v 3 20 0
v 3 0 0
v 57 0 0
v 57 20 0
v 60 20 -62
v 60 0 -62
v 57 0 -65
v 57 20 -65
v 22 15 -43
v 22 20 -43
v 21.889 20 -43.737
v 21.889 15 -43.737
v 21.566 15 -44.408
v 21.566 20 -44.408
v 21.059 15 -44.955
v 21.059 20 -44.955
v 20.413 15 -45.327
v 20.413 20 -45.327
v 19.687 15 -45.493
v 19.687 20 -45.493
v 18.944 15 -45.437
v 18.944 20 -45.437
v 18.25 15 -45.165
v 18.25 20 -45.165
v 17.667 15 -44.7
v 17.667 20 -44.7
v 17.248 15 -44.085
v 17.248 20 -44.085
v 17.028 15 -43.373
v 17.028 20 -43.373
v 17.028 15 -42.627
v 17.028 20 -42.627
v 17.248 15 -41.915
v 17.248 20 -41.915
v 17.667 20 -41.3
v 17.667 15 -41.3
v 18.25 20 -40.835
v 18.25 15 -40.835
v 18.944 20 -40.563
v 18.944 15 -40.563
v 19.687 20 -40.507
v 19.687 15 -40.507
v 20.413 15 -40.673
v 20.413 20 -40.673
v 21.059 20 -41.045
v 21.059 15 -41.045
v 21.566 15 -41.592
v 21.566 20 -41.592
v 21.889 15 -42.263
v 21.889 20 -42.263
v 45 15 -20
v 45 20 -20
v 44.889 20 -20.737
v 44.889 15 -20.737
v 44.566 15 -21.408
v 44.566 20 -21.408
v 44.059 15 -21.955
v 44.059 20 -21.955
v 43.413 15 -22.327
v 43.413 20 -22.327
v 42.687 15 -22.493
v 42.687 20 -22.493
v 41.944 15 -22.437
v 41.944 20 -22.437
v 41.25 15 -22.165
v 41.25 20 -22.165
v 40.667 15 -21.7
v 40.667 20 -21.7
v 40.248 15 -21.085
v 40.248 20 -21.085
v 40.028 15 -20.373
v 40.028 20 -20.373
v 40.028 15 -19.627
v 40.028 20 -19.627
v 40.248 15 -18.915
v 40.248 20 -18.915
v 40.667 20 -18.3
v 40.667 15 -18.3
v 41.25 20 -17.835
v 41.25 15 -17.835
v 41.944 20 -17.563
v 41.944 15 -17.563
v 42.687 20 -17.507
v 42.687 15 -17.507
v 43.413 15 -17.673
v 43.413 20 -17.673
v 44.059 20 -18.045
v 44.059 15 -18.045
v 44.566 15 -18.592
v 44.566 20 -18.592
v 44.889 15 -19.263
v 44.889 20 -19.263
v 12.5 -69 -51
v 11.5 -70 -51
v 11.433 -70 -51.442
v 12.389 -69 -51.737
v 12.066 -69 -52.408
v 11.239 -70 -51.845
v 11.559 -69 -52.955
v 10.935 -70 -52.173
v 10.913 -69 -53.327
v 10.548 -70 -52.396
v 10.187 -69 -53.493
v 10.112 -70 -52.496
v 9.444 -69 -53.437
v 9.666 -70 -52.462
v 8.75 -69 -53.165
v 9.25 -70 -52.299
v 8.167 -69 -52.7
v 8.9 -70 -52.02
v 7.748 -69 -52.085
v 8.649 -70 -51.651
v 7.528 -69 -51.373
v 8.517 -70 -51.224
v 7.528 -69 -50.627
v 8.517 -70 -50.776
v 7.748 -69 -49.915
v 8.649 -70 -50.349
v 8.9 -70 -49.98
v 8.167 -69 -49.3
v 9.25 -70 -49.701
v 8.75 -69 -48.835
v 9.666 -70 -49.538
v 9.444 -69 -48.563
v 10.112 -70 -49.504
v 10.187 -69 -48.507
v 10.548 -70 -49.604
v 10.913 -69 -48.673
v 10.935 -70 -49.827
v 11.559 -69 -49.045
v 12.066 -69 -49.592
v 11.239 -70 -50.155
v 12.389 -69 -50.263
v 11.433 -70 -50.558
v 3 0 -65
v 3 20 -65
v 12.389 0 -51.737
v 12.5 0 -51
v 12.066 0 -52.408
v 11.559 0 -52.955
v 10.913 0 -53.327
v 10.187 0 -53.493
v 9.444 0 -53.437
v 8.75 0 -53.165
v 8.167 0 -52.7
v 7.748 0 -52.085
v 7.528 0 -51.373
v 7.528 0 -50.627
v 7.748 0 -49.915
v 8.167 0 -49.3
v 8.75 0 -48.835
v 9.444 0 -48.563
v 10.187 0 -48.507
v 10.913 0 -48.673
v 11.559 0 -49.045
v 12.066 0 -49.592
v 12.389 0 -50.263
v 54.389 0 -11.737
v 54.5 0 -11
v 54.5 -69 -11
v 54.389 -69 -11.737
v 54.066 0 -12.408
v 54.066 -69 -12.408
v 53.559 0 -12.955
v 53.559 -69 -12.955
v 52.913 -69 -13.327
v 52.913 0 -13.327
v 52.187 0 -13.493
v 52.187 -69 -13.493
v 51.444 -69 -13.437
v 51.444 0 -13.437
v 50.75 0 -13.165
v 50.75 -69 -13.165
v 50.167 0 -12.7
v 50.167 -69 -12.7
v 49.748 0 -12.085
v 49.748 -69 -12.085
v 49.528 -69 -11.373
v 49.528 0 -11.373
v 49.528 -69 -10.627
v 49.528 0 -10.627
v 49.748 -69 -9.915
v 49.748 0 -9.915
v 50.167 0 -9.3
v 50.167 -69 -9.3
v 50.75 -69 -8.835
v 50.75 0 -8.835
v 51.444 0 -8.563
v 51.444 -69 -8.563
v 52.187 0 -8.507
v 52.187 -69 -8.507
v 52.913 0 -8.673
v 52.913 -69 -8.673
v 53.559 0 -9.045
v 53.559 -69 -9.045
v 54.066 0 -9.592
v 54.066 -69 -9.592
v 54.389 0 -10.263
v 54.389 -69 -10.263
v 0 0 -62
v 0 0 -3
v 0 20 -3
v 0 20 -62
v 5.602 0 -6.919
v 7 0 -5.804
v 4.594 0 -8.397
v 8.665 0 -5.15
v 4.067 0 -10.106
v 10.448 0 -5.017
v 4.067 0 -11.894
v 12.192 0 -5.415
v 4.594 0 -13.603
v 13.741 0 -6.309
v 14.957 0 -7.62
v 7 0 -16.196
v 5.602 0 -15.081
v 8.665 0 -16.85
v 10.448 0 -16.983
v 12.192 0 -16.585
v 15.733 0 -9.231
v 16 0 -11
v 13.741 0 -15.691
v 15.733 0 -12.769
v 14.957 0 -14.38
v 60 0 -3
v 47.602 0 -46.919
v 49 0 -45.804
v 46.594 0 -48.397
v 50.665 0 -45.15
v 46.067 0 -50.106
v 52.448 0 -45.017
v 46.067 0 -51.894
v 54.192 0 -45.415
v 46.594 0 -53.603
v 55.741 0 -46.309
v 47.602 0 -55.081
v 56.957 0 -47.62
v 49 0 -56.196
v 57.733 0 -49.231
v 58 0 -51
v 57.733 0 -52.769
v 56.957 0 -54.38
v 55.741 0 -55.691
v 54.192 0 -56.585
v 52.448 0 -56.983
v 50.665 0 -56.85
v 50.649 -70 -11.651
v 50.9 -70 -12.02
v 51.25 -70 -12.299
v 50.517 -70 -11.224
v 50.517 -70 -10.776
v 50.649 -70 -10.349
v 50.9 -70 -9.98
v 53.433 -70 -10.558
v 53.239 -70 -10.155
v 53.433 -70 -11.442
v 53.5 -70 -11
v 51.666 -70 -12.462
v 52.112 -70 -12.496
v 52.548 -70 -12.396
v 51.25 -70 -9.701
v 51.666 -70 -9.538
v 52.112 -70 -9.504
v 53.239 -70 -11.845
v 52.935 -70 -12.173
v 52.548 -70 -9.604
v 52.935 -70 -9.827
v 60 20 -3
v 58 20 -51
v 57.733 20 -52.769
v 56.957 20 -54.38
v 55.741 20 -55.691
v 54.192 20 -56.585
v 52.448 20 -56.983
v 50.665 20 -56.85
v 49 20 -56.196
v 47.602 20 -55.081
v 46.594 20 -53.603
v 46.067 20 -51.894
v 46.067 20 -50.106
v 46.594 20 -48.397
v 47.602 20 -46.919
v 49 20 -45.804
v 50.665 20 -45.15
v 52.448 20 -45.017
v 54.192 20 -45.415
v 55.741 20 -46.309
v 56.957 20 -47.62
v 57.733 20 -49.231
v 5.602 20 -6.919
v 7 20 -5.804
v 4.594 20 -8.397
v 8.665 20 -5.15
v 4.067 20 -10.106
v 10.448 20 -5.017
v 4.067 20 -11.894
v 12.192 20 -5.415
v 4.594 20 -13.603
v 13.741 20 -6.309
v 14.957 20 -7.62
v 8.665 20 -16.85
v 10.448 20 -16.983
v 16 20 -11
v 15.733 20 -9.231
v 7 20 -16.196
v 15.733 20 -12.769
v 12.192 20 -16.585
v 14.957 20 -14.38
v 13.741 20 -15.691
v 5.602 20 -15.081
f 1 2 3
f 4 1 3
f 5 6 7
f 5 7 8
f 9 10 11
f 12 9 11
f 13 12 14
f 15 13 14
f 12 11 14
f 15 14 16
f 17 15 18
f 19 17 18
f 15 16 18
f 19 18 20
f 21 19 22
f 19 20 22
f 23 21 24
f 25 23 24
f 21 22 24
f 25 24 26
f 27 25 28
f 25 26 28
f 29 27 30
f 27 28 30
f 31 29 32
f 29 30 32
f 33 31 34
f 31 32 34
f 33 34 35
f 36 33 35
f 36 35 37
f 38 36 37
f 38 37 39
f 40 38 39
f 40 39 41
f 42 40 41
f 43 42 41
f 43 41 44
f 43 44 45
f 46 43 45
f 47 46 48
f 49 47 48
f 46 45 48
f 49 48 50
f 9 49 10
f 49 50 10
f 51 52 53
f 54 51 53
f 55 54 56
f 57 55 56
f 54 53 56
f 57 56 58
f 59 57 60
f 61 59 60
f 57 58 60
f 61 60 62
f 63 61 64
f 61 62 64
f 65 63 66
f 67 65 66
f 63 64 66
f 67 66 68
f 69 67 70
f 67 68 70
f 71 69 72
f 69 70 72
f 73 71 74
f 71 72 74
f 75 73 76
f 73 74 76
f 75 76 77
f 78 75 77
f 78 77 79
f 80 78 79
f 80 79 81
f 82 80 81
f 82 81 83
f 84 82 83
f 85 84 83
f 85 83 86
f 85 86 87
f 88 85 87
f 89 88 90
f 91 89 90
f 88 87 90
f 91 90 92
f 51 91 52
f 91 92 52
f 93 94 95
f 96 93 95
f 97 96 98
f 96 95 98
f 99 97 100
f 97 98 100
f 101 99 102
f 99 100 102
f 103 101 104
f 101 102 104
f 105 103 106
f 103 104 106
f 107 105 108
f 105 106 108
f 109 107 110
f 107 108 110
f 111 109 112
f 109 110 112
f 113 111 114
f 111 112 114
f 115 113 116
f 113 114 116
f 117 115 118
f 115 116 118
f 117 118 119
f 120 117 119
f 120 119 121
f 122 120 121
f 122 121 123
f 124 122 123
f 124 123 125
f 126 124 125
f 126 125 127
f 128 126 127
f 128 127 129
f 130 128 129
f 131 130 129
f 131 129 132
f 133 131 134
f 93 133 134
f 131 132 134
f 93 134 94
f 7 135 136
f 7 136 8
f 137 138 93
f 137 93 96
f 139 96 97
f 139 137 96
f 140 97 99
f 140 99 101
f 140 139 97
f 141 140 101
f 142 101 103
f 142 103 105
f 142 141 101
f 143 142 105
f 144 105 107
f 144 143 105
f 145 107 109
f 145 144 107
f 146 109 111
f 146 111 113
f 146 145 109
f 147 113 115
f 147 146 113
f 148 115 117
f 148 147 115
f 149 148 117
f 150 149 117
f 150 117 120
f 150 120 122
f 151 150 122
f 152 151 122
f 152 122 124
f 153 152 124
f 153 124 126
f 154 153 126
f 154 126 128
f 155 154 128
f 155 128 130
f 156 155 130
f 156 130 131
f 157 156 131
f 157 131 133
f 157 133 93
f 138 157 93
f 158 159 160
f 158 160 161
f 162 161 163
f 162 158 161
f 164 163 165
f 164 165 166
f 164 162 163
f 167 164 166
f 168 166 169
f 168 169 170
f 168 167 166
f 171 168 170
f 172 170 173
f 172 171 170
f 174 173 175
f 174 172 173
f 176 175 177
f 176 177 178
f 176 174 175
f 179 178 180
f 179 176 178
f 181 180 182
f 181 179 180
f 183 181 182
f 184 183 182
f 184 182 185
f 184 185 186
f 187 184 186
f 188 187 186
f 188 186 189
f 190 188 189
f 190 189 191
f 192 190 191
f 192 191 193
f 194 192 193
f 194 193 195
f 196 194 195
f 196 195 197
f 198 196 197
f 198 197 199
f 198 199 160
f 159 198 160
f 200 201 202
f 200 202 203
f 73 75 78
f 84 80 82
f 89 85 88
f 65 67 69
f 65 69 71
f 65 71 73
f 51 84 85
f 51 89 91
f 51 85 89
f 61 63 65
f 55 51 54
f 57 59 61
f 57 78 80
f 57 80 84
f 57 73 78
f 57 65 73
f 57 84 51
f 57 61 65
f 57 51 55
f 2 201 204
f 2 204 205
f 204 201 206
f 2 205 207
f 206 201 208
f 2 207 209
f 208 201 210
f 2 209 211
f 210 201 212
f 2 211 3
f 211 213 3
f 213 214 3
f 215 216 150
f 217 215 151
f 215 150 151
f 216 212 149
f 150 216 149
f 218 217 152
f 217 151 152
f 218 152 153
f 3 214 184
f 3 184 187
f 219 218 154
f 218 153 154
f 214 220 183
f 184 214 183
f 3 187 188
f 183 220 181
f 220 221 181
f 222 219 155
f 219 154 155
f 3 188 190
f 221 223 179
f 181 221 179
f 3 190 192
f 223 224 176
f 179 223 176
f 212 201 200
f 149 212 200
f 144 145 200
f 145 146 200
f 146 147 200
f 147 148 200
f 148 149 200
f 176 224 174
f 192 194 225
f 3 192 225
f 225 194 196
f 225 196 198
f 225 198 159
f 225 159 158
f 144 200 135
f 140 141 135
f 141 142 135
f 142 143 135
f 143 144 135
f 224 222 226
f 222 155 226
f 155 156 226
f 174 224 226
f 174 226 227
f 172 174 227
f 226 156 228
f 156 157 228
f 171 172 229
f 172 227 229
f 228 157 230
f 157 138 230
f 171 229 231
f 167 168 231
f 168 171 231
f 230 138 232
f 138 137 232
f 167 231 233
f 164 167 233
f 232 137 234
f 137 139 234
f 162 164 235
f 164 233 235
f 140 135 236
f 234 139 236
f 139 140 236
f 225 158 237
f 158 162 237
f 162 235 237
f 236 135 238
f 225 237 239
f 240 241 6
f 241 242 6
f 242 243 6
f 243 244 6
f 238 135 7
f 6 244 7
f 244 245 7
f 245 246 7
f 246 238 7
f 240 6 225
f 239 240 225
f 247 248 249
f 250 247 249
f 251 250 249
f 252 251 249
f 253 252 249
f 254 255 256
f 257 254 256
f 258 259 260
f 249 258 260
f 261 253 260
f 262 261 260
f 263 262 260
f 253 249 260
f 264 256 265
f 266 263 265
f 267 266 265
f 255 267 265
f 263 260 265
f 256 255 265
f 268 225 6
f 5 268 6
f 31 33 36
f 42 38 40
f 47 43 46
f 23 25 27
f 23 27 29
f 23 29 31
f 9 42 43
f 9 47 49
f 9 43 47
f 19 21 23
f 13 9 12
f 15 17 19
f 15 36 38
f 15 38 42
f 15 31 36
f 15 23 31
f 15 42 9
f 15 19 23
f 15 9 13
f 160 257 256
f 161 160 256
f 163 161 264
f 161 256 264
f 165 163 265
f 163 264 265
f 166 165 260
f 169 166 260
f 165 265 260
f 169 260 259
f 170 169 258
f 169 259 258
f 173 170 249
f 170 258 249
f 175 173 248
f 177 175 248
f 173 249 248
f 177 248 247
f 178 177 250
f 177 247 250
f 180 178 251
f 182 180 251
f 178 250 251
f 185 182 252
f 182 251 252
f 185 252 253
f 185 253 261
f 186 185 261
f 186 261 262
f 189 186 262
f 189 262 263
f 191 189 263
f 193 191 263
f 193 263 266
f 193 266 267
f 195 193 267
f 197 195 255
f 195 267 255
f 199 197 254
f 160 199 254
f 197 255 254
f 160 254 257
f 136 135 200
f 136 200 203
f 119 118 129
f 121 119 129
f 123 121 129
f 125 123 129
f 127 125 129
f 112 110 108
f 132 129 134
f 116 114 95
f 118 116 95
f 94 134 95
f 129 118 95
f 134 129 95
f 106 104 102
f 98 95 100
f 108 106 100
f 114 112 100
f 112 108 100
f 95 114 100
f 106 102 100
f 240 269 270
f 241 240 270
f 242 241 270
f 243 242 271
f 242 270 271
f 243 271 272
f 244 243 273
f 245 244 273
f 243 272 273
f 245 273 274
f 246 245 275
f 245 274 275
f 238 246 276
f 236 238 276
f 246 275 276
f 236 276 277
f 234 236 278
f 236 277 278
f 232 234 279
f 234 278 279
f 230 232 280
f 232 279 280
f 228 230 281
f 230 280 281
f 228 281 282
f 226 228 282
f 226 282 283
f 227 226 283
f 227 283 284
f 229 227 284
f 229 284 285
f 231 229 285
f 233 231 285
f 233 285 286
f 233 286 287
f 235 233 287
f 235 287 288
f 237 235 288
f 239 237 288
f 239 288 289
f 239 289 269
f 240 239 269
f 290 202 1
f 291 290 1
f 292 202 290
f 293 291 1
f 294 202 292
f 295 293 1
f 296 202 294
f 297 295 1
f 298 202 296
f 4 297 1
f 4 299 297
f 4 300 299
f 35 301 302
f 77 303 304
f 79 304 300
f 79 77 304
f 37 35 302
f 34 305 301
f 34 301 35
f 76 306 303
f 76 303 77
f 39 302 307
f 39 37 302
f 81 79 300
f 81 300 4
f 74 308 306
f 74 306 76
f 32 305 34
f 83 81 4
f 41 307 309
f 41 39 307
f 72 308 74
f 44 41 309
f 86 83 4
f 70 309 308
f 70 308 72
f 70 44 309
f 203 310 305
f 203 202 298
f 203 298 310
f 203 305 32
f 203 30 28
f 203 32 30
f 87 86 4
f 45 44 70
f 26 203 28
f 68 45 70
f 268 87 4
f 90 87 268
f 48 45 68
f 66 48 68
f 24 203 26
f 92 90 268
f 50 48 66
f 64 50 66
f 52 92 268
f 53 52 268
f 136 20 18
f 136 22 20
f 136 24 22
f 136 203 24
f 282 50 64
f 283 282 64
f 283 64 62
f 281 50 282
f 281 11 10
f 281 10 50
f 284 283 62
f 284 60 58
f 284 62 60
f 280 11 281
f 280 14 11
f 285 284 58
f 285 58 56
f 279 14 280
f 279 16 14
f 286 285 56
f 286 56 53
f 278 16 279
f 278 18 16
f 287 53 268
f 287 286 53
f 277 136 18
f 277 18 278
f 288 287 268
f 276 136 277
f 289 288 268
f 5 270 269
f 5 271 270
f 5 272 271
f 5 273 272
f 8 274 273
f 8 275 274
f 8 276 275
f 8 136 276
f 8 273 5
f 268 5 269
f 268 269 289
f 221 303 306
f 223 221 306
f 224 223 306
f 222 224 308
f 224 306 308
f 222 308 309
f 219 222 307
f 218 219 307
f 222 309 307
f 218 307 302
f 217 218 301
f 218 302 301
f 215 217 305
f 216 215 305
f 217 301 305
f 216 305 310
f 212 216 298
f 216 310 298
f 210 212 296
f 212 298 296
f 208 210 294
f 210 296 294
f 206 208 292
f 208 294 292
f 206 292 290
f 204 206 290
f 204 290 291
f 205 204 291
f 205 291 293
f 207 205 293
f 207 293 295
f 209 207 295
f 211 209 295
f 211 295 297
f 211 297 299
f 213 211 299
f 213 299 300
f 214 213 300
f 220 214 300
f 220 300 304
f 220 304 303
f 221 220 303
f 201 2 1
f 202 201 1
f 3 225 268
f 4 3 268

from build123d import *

# Parameters (mm, degrees)
SKETCH1_W           = 60
SKETCH1_H           = 65
BOSS_EXTRUDE1_DEPTH = 20
SKETCH2_R           = 6
CUT_EXTRUDE1_DEPTH  = 21
SKETCH2_3_R         = 2.5
CUT_EXTRUDE2_DEPTH  = 5
SKETCH2_4_R         = 2.5
BOSS_EXTRUDE2_DEPTH = 90
CHAMFER1_SIZE       = 1
CHAMFER2_SIZE       = 3


with BuildPart() as part:
    # Sketch1 → Boss-Extrude1 (new body)
    with BuildSketch(Plane(origin=(0, 0, 0), x_dir=(1, 0, 0), z_dir=(0, 1, 0))):
        with Locations((30, 32.5)):
            Rectangle(SKETCH1_W, SKETCH1_H)
    extrude(amount=BOSS_EXTRUDE1_DEPTH)

    # Sketch2 → Cut-Extrude1 (cut, through all)
    with BuildSketch(Plane(origin=(0, 20, 0), x_dir=(1, 0, 0), z_dir=(0, 1, 0))):
        with Locations((52, 51)):
            Circle(SKETCH2_R)
        with Locations((10, 11)):
            Circle(SKETCH2_R)
    extrude(amount=-CUT_EXTRUDE1_DEPTH, mode=Mode.SUBTRACT)

    # Sketch2<3> → Cut-Extrude2 (cut)
    with BuildSketch(Plane(origin=(0, 20, 0), x_dir=(1, 0, 0), z_dir=(0, 1, 0))):
        with Locations((19.5, 43)):
            Circle(SKETCH2_3_R)
        with Locations((42.5, 20)):
            Circle(SKETCH2_3_R)
    extrude(amount=-CUT_EXTRUDE2_DEPTH, mode=Mode.SUBTRACT)

    # Sketch2<4> → Boss-Extrude2 (add)
    with BuildSketch(Plane(origin=(0, 20, 0), x_dir=(1, 0, 0), z_dir=(0, 1, 0))):
        with Locations((52, 11)):
            Circle(SKETCH2_4_R)
        with Locations((10, 51)):
            Circle(SKETCH2_4_R)
    extrude(amount=-BOSS_EXTRUDE2_DEPTH)

    # Chamfer1
    chamfer1_edges = [part.edges().sort_by_distance(p)[0] for p in [
        (49.5, -70, -11),
        (7.5, -70, -51),
    ]]
    chamfer(chamfer1_edges, length=CHAMFER1_SIZE)

    # Chamfer2
    chamfer2_edges = [part.edges().sort_by_distance(p)[0] for p in [
        (0, 10, -65),
        (60, 10, -65),
        (60, 10, 0),
        (0, 10, 0),
    ]]
    chamfer(chamfer2_edges, length=CHAMFER2_SIZE)


solid = part.part
